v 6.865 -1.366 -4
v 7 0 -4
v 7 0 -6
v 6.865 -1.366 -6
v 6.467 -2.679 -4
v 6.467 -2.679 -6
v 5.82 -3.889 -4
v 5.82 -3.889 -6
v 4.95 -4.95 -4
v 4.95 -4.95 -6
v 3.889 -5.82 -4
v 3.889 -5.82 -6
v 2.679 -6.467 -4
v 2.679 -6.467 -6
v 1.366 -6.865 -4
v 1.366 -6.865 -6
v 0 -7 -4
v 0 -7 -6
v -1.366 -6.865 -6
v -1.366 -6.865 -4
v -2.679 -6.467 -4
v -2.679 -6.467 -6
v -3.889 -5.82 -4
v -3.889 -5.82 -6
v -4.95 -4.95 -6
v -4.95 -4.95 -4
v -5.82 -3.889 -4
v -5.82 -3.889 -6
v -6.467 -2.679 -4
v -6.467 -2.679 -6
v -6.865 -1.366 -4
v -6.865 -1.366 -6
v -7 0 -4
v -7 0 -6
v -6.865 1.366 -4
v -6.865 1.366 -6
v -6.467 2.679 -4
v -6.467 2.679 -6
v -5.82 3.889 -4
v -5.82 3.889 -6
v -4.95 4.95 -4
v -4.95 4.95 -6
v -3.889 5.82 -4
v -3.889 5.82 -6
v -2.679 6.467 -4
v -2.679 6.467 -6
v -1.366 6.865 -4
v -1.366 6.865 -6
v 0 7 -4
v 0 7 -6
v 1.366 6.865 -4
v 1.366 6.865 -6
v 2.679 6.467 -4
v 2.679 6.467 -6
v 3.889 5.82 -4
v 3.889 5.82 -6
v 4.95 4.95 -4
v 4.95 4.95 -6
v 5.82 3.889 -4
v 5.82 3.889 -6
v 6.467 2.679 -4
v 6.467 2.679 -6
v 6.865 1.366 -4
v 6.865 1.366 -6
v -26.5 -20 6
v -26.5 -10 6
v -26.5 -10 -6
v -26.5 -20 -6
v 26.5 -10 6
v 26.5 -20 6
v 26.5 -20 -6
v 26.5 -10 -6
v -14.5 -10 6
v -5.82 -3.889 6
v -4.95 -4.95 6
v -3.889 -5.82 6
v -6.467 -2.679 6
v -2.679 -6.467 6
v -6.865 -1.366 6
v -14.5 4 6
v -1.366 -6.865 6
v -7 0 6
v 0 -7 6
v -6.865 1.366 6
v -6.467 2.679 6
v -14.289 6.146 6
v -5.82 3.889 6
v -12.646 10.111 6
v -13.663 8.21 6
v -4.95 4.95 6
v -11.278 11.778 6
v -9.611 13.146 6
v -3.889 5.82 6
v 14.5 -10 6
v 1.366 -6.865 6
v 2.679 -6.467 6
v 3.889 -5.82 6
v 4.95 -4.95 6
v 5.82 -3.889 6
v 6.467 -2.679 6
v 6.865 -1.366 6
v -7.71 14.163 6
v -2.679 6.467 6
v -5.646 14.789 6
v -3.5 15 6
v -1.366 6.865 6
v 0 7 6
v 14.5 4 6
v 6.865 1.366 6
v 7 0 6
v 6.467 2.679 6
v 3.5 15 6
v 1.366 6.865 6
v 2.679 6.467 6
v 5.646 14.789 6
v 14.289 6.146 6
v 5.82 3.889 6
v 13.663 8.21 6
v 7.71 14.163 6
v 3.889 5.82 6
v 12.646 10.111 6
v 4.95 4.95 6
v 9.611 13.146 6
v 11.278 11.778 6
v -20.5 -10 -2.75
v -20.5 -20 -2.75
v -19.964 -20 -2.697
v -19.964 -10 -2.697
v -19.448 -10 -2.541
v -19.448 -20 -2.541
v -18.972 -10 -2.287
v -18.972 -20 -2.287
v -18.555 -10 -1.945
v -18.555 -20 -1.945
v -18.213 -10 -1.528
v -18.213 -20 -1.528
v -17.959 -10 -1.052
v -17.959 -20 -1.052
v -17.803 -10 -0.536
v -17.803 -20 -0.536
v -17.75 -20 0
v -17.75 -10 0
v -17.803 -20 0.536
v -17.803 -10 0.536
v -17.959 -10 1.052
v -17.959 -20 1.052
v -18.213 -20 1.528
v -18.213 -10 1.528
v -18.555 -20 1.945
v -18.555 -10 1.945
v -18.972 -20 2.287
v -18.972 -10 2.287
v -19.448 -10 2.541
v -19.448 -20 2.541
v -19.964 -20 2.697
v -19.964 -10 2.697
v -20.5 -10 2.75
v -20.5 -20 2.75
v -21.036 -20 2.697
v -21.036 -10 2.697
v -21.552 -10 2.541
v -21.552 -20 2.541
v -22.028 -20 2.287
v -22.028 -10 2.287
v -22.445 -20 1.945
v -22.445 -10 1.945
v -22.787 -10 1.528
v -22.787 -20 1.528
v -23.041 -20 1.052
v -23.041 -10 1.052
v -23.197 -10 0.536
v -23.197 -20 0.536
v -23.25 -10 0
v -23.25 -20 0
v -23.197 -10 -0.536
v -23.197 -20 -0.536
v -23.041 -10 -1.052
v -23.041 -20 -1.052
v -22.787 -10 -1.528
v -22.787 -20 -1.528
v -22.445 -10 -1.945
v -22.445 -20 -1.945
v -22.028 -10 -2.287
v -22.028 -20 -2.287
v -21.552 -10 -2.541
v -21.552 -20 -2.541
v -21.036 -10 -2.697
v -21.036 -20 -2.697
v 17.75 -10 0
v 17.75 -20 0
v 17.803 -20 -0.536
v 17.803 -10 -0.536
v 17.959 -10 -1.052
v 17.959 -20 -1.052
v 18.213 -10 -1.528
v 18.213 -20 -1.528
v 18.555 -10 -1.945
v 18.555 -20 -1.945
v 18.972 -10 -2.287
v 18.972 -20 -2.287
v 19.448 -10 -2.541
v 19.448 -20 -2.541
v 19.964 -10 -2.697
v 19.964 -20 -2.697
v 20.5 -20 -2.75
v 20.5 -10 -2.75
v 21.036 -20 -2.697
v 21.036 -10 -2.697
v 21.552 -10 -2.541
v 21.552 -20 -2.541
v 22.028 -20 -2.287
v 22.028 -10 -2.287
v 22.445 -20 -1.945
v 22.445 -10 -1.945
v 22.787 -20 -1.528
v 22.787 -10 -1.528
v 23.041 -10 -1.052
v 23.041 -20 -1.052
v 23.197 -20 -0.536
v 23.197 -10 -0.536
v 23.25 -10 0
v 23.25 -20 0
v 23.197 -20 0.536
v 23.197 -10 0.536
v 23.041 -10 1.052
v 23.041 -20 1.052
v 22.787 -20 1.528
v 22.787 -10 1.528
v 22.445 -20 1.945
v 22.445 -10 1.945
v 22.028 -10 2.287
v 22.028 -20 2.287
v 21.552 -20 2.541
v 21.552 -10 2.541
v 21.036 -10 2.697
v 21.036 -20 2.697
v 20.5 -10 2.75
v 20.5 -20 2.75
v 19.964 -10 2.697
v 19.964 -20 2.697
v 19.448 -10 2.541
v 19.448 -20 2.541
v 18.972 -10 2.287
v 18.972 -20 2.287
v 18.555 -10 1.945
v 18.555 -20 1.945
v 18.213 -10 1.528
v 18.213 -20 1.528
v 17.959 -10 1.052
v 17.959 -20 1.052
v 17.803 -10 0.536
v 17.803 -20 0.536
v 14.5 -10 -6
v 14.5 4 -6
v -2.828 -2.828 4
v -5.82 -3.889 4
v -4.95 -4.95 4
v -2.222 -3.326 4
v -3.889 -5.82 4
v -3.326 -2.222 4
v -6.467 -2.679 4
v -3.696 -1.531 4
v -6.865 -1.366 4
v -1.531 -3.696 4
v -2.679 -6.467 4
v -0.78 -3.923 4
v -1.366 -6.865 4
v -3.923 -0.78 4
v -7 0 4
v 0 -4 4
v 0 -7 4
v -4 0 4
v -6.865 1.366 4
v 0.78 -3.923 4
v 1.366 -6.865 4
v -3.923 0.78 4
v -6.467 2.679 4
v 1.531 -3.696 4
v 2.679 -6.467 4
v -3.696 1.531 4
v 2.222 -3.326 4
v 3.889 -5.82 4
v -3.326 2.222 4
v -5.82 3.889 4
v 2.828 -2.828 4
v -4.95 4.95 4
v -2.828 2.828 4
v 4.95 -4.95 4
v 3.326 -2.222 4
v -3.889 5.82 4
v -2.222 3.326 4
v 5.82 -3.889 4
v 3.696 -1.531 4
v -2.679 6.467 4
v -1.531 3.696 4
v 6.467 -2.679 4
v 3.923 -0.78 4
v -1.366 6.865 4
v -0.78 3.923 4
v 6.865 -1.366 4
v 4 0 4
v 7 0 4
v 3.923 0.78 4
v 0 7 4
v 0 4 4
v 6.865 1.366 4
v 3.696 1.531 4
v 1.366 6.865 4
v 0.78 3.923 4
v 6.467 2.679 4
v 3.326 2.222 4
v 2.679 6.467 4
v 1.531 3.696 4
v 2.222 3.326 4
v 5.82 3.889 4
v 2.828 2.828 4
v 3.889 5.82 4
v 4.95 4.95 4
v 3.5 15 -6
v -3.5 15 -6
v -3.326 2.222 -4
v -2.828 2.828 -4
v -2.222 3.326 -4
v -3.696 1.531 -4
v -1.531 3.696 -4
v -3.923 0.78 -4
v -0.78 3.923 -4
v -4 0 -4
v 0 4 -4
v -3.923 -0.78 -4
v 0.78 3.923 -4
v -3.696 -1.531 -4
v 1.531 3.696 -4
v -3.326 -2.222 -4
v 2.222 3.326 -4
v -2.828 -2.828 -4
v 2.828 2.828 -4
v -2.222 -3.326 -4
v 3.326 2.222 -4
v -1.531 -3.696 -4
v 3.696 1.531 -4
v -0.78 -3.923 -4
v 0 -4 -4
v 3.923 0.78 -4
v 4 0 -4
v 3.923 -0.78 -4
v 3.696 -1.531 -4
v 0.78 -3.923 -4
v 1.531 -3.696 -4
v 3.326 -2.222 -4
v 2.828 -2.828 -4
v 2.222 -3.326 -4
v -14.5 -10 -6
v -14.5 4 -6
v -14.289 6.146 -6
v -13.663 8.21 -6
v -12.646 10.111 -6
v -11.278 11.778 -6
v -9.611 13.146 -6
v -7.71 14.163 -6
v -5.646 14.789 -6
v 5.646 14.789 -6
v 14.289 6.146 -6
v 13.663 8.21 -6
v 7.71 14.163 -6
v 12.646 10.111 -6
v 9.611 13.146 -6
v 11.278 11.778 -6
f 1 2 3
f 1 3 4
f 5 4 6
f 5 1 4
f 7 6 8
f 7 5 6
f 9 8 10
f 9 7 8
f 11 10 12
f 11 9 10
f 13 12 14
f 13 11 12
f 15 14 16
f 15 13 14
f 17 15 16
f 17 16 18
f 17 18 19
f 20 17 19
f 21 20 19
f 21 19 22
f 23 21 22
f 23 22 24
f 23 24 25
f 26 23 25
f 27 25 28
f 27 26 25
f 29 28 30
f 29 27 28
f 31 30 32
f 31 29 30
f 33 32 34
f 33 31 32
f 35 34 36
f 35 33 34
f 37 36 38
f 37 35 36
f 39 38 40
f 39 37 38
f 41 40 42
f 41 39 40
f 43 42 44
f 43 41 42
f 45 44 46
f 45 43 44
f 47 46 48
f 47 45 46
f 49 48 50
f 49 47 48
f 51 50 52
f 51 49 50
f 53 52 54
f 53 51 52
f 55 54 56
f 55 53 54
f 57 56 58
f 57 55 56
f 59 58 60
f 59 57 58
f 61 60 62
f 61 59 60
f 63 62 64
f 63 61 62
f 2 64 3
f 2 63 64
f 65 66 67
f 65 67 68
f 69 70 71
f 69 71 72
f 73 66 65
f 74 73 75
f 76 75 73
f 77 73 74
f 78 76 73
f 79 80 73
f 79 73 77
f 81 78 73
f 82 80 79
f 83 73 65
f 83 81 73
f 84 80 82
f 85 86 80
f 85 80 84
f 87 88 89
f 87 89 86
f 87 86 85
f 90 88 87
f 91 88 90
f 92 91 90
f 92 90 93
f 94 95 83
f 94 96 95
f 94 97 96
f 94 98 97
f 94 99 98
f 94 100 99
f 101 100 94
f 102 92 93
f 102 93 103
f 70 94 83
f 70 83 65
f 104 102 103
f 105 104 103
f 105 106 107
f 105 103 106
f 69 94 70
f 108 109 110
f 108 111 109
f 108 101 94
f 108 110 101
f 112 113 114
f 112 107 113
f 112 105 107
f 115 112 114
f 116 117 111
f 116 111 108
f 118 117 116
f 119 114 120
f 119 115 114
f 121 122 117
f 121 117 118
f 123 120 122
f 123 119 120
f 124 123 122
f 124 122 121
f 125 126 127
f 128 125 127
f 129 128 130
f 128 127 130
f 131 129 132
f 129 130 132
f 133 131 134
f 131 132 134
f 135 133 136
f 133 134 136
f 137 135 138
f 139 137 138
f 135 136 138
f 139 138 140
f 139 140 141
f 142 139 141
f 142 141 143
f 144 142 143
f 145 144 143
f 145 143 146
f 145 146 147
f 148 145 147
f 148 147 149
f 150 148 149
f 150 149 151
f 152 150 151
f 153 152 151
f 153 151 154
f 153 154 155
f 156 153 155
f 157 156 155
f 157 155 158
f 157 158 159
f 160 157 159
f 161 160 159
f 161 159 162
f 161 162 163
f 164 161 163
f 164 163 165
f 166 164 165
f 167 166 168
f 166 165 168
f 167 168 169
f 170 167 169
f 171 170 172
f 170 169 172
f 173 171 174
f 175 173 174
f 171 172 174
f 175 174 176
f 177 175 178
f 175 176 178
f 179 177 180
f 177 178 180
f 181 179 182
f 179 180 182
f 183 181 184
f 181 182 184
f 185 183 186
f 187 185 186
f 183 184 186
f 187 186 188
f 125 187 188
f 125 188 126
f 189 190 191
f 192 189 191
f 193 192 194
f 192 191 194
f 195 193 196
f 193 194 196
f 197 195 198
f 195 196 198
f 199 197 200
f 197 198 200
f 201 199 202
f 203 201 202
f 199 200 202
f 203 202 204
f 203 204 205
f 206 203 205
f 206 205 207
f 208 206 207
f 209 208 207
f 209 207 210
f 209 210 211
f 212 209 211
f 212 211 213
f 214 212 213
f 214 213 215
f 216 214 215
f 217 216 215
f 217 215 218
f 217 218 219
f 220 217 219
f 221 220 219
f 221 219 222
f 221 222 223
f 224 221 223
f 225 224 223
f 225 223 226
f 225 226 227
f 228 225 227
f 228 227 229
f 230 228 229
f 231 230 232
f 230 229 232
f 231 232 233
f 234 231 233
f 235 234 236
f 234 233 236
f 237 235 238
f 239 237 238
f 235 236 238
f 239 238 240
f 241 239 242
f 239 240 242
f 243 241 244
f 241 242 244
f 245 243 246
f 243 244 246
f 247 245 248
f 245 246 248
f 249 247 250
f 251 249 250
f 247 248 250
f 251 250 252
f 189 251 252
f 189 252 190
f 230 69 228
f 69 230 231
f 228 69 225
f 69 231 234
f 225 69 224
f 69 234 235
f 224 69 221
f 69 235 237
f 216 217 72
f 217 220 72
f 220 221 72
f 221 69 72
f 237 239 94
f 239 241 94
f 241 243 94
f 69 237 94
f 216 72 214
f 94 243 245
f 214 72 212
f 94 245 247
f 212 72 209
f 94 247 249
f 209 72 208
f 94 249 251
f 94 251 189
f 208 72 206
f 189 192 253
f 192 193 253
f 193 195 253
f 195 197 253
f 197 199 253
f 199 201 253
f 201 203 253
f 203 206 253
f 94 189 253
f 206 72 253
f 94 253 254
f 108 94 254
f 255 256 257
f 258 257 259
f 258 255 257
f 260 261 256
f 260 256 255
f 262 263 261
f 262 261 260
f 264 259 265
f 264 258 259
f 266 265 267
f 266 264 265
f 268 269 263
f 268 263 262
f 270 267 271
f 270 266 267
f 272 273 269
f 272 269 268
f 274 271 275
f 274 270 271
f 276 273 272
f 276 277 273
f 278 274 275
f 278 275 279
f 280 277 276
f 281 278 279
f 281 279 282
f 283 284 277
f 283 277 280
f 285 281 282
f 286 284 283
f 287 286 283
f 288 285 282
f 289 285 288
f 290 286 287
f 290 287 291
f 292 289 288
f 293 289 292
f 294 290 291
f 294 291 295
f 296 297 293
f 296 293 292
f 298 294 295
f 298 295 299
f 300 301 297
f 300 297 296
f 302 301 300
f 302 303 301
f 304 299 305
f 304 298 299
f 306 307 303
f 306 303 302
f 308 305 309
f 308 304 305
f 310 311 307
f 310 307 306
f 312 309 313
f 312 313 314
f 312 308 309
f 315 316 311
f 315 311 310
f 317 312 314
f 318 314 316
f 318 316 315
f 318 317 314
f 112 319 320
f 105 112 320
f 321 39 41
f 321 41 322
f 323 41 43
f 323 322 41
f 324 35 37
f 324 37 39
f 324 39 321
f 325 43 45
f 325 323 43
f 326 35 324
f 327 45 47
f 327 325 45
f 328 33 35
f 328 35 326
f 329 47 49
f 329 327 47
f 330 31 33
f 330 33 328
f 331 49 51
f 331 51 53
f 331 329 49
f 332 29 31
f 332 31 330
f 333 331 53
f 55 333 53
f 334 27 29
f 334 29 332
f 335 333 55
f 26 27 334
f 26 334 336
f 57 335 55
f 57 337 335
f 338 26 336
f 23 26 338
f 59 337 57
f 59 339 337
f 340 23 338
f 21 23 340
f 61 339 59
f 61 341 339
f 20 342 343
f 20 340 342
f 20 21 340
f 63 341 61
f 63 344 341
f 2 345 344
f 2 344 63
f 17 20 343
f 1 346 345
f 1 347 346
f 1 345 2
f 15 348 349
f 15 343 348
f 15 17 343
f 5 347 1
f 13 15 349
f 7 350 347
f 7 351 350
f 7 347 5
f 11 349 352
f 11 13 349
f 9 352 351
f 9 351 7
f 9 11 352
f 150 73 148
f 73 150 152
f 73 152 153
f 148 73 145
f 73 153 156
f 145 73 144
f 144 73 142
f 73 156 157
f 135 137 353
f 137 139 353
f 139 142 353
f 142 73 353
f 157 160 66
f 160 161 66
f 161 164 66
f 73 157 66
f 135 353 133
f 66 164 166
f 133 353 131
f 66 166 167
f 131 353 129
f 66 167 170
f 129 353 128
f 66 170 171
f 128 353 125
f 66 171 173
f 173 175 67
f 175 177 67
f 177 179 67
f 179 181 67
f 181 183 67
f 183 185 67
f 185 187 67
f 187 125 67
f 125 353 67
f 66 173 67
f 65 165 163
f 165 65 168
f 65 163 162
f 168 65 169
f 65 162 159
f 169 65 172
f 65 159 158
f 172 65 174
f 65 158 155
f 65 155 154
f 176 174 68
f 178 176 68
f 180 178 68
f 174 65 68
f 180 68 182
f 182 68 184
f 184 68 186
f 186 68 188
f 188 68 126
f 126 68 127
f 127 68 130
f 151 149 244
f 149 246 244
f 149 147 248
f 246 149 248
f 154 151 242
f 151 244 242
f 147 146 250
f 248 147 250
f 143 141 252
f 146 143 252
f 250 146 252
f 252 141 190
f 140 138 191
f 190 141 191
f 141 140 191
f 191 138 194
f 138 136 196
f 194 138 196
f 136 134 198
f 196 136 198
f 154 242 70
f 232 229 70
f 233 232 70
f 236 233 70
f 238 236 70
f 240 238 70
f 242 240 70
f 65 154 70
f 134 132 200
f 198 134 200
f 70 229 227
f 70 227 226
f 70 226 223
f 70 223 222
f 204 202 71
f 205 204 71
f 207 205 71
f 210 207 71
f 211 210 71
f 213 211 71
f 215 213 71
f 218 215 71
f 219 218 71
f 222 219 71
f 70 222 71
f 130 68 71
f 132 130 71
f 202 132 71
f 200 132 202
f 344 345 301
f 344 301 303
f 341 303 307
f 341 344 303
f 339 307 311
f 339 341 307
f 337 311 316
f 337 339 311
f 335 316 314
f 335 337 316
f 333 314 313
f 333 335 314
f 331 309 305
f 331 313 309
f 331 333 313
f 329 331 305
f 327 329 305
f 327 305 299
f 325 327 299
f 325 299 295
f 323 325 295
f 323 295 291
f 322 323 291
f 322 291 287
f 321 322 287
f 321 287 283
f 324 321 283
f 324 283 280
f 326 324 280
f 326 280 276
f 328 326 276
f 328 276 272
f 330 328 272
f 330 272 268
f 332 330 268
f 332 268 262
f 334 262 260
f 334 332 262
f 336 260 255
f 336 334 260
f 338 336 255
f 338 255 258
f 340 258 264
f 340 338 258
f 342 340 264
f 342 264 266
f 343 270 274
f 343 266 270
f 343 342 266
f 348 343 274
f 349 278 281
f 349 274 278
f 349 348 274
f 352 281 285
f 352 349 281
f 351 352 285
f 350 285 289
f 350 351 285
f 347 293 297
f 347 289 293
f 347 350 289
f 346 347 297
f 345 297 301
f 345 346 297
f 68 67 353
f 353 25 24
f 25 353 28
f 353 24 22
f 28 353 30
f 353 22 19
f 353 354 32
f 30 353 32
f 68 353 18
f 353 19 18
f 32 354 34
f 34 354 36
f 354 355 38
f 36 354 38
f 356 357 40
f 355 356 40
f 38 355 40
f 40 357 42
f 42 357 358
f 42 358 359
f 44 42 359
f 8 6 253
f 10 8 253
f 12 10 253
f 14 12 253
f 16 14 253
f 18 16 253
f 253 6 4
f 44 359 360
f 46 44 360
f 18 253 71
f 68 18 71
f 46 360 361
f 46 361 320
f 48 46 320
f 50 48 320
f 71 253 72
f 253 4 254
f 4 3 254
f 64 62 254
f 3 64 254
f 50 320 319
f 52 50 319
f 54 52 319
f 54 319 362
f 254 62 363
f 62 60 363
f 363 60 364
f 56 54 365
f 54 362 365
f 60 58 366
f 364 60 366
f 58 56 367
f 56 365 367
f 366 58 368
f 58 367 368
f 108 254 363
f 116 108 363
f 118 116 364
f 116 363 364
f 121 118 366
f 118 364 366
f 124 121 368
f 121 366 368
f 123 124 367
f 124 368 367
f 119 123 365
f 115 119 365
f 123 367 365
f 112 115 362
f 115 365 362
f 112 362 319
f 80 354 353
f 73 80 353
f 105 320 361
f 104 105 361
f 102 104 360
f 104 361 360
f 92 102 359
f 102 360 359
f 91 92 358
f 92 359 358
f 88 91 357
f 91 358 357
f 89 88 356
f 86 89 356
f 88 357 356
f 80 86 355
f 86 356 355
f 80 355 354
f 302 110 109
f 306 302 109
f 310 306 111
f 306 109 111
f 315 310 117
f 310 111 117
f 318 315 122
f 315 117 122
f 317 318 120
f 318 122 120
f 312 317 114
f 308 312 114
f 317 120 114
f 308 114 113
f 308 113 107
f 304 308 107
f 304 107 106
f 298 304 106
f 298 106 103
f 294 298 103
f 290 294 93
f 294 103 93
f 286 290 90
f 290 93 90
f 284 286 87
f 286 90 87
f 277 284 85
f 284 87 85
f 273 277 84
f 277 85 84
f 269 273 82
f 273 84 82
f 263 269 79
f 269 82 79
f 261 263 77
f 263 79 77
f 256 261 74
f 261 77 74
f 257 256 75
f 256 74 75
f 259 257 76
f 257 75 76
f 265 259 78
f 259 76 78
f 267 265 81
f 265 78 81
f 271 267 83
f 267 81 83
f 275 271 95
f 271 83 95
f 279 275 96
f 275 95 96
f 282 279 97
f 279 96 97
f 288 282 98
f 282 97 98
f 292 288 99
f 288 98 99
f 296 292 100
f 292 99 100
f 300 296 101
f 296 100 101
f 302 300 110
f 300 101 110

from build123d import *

# Parameters (mm, degrees)
EXTRUDE_1_DEPTH      = 6
EXTRUDE_1_DEPTH_BACK = 6
SKETCH_1_R           = 4
SKETCH_2_R           = 7
CUT_EXTRUDE_1_DEPTH  = 2
CUT_EXTRUDE_START    = -2
SKETCH_3_R           = 7
CUT_EXTRUDE_2_DEPTH  = 2
SKETCH_4_R           = 2.75
CUT_EXTRUDE_3_DEPTH  = 17


with BuildPart() as part:
    # 草图1 → 凸台-拉伸1 (new, two sides: drawn at the far end of the back side and taken through both)
    with BuildSketch(Plane.XY.offset(-EXTRUDE_1_DEPTH_BACK)):
        with BuildLine():
            Line((3.5, 15), (-3.5, 15))
            ThreePointArc((-3.5, 15), (-11.278174593, 11.778174593), (-14.5, 4))
            Line((-14.5, 4), (-14.5, -10))
            Line((-14.5, -10), (-26.5, -10))
            Line((-26.5, -10), (-26.5, -20))
            Line((-26.5, -20), (26.5, -20))
            Line((26.5, -20), (26.5, -10))
            Line((26.5, -10), (14.5, -10))
            Line((14.5, -10), (14.5, 4))
            ThreePointArc((14.5, 4), (11.278174593, 11.778174593), (3.5, 15))
        make_face()
        Circle(SKETCH_1_R, mode=Mode.SUBTRACT)
    extrude(amount=EXTRUDE_1_DEPTH + EXTRUDE_1_DEPTH_BACK)

    # 草图2 → 切除-拉伸1 (cut)
    with BuildSketch(Plane.XY.offset(6)):
        Circle(SKETCH_2_R)
    extrude(amount=-CUT_EXTRUDE_1_DEPTH, mode=Mode.SUBTRACT)

    # 草图3 → 切除-拉伸2 (cut)
    with BuildSketch(Plane(origin=(0, 0, -6), x_dir=(-1, 0, 0), z_dir=(0, 0, -1)).offset(CUT_EXTRUDE_START)):
        Circle(SKETCH_3_R)
    extrude(amount=CUT_EXTRUDE_2_DEPTH, mode=Mode.SUBTRACT)

    # 草图4 → 切除-拉伸3 (cut)
    with BuildSketch(Plane.XZ.offset(20)):
        with Locations((-20.5, 0)):
            Circle(SKETCH_4_R)
        with Locations((20.5, 0)):
            Circle(SKETCH_4_R)
    extrude(amount=-CUT_EXTRUDE_3_DEPTH, mode=Mode.SUBTRACT)


solid = part.part
